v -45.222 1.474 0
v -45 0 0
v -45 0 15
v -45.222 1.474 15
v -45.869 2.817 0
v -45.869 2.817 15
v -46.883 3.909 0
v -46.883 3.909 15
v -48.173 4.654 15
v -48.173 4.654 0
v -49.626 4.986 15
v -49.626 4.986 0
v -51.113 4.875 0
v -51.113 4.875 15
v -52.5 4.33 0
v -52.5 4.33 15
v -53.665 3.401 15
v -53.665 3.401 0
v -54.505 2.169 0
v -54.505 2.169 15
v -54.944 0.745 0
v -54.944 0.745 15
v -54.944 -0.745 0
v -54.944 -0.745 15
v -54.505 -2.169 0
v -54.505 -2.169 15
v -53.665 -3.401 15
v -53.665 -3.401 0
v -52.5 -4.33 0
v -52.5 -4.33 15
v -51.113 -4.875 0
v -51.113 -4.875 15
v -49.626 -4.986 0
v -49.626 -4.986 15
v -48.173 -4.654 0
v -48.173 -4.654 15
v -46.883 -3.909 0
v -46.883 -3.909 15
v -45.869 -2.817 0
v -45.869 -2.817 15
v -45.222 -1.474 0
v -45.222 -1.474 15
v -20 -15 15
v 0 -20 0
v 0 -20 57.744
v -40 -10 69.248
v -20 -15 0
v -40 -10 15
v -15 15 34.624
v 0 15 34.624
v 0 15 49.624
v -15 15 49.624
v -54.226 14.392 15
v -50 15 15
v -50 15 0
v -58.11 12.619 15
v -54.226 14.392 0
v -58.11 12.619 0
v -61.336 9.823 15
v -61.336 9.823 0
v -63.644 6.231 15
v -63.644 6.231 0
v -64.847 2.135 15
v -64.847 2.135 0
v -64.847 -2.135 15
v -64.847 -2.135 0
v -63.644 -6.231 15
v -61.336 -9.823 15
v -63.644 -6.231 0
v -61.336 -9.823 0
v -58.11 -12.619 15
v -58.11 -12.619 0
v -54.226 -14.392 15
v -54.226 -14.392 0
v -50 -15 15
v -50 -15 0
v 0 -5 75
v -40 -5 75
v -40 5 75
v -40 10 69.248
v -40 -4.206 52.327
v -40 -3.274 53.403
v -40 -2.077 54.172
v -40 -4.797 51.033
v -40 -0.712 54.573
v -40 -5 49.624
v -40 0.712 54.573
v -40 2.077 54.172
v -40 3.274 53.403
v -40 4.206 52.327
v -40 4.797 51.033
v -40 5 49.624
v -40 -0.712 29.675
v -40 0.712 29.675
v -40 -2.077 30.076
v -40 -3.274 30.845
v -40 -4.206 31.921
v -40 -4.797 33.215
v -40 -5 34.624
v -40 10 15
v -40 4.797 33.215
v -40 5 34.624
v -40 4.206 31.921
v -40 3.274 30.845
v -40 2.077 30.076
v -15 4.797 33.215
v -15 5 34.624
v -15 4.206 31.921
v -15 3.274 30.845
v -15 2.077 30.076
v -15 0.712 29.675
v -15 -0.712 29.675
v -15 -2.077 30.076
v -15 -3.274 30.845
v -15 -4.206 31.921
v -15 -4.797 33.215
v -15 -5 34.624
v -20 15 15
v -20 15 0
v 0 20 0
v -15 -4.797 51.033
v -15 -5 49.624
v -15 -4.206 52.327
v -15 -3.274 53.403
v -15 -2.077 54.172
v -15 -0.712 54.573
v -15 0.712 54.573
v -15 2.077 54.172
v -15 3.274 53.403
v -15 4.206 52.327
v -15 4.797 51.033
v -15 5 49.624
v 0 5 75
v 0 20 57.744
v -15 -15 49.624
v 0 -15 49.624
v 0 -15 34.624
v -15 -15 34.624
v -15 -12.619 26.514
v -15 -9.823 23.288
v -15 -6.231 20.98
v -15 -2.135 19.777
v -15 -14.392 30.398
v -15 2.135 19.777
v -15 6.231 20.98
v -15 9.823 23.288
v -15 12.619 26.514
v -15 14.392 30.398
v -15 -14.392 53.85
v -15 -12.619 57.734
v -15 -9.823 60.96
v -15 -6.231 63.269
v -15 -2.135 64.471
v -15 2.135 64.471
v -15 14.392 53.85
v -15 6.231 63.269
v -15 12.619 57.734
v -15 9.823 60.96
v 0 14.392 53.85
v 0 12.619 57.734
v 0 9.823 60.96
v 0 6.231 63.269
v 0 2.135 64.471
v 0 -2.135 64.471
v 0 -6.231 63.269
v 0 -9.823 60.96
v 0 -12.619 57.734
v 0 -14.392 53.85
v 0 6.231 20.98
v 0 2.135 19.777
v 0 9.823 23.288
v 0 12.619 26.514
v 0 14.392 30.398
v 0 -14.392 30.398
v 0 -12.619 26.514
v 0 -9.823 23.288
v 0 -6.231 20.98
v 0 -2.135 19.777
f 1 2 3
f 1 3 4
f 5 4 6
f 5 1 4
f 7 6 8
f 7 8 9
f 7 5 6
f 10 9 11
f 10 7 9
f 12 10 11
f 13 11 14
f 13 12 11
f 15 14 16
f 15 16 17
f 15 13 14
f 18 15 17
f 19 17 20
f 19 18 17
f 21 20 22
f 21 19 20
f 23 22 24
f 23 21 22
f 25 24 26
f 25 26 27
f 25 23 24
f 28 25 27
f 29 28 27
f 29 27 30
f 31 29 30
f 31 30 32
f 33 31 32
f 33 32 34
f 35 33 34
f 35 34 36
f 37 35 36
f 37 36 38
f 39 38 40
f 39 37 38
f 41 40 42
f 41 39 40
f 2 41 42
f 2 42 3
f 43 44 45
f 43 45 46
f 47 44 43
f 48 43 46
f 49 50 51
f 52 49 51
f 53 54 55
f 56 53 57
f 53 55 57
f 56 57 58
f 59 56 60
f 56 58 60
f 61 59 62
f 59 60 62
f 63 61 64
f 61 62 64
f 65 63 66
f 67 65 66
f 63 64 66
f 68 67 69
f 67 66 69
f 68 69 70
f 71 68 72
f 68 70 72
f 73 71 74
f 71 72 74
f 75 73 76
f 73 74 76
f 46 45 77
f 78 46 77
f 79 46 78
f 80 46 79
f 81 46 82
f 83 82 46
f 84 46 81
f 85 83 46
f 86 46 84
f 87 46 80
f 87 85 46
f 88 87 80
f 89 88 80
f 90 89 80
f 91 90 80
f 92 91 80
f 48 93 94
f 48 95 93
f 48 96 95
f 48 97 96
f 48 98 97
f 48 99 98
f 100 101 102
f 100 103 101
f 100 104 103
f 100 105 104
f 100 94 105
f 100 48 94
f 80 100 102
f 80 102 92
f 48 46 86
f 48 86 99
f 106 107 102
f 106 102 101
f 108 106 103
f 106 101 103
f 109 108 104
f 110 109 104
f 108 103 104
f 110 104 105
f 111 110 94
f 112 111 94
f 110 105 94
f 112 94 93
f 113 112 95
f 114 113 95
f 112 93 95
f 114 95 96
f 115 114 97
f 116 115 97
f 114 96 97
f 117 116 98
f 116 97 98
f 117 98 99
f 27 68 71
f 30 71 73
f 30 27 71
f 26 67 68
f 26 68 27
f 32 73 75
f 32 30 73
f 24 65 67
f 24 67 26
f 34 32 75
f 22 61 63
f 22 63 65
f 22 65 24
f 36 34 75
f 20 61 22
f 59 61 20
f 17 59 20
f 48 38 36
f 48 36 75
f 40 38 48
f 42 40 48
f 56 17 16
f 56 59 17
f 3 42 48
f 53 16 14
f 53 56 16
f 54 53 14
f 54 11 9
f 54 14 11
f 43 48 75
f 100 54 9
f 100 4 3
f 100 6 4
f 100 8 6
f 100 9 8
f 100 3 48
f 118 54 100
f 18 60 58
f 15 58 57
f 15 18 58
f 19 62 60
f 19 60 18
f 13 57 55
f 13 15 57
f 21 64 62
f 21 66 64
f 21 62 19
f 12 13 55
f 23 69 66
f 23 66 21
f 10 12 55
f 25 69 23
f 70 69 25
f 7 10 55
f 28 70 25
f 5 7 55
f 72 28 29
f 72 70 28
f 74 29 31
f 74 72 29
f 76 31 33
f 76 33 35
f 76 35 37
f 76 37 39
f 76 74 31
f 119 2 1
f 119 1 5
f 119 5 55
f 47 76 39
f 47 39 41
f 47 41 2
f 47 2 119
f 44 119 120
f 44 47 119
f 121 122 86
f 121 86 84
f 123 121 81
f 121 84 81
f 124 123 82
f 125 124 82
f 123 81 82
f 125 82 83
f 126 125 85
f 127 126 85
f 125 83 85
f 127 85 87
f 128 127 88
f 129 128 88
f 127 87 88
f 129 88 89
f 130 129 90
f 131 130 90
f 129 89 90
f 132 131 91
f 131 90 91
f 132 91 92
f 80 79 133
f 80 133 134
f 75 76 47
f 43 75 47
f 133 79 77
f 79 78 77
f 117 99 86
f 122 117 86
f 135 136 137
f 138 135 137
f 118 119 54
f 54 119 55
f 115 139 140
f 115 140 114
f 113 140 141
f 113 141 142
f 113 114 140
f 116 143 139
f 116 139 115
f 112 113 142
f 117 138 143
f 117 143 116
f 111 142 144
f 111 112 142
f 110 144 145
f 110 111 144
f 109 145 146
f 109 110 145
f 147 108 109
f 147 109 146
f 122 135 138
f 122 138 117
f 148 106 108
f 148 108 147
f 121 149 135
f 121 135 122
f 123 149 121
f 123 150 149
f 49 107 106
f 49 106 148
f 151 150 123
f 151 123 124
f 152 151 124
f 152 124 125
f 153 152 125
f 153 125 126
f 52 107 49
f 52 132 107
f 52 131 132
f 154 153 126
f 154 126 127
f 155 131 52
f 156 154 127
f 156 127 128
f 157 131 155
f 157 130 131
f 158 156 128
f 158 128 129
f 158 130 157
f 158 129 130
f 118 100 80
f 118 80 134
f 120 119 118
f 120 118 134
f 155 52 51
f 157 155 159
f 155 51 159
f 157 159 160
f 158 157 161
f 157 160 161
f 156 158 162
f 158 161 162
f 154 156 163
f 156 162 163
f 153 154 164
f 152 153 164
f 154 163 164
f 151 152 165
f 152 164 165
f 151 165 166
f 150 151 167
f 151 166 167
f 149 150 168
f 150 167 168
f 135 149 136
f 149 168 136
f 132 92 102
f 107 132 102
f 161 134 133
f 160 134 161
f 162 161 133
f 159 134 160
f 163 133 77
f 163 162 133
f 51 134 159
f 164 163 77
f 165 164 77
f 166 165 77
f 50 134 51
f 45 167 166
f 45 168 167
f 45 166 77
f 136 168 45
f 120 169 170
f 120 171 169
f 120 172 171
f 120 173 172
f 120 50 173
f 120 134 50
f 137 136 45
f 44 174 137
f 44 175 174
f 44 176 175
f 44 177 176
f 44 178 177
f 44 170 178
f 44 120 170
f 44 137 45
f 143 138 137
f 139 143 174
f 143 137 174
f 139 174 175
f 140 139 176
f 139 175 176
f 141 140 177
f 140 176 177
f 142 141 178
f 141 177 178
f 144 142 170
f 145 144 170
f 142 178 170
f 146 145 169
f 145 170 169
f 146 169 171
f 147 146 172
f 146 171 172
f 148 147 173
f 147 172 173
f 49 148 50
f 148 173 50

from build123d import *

# Parameters (mm, degrees)
F0_R     = 5
F1_DEPTH = 15
F3_DEPTH = 75
F5_DEPTH = 80
F7_DEPTH = 50
F9_DEPTH = 15


with BuildPart() as f1:
    # F0 (on Top) → F1 (new body)
    with BuildSketch(Plane.XY):
        with BuildLine():
            Line((0, 15), (-50, 15))
            ThreePointArc((-50, 15), (-65, 0), (-50, -15))
            Line((-50, -15), (0, -15))
            Line((0, -15), (0, 0))
            Line((0, 0), (0, 15))
        make_face()
        with Locations((-50, 0)):
            Circle(F0_R, mode=Mode.SUBTRACT)
    extrude(amount=F1_DEPTH)

    # F2 (on face) → F3 (join)
    with BuildSketch(Plane(origin=(0, 0, 0), x_dir=(1, 0, 0), z_dir=(0, 0, -1))):
        Polygon((0, -20), (0, -15), (-20, -15), align=None)
        Polygon((0, -15), (0, 0), (0, 15), (-20, 15), (-40, 10), (-40, 0), (-40, -10), (-20, -15), align=None)
        Polygon((-20, 15), (0, 15), (0, 20), align=None)
    extrude(amount=-F3_DEPTH)

    # F4 (on face) → F5 (cut)
    with BuildSketch(Plane.YZ):
        Polygon((34.8571650684, 75), (20, 75), (20, 57.7444738917), (25.7445386642, 51.1361380983), align=None)
        Polygon((20, 75), (5, 75), (20, 57.7444738917), align=None)
        Polygon((-20, 57.7444738917), (-5, 75), (-20, 75), align=None)
        Polygon((-25.7445386642, 51.1361380983), (-20, 57.7444738917), (-20, 75), (-34.8571650684, 75), align=None)
    extrude(amount=-F5_DEPTH, mode=Mode.SUBTRACT)

    # F6 (on face) → F7 (cut)
    with BuildSketch(Plane(origin=(-40, 0, 0), x_dir=(0, -1, 0), z_dir=(-1, 0, 0))):
        with BuildLine():
            Line((5, 42.1240789819), (5, 49.6240789819))
            ThreePointArc((5, 49.6240789819), (0, 54.6240789819), (-5, 49.6240789819))
            Line((-5, 49.6240789819), (-5, 42.1240789819))
            Line((-5, 42.1240789819), (-5, 34.6240789819))
            ThreePointArc((-5, 34.6240789819), (0, 29.6240789819), (5, 34.6240789819))
            Line((5, 34.6240789819), (5, 42.1240789819))
        make_face()
    extrude(amount=-F7_DEPTH, mode=Mode.SUBTRACT)

    # F8 (on face) → F9 (cut)
    with BuildSketch(Plane.YZ):
        with BuildLine():
            Line((15, 34.6240789819), (15, 49.6240789819))
            ThreePointArc((15, 49.6240789819), (0, 64.6240789819), (-15, 49.6240789819))
            Line((-15, 49.6240789819), (-15, 34.6240789819))
            ThreePointArc((-15, 34.6240789819), (0, 19.6240789819), (15, 34.6240789819))
        make_face()
        with BuildLine():
            ThreePointArc((5, 34.6240789819), (0, 29.6240789819), (-5, 34.6240789819))
            Line((-5, 34.6240789819), (-5, 49.6240789819))
            ThreePointArc((-5, 49.6240789819), (0, 54.6240789819), (5, 49.6240789819))
            Line((5, 49.6240789819), (5, 34.6240789819))
        make_face(mode=Mode.SUBTRACT)
    extrude(amount=-F9_DEPTH, mode=Mode.SUBTRACT)


solid = f1.part
